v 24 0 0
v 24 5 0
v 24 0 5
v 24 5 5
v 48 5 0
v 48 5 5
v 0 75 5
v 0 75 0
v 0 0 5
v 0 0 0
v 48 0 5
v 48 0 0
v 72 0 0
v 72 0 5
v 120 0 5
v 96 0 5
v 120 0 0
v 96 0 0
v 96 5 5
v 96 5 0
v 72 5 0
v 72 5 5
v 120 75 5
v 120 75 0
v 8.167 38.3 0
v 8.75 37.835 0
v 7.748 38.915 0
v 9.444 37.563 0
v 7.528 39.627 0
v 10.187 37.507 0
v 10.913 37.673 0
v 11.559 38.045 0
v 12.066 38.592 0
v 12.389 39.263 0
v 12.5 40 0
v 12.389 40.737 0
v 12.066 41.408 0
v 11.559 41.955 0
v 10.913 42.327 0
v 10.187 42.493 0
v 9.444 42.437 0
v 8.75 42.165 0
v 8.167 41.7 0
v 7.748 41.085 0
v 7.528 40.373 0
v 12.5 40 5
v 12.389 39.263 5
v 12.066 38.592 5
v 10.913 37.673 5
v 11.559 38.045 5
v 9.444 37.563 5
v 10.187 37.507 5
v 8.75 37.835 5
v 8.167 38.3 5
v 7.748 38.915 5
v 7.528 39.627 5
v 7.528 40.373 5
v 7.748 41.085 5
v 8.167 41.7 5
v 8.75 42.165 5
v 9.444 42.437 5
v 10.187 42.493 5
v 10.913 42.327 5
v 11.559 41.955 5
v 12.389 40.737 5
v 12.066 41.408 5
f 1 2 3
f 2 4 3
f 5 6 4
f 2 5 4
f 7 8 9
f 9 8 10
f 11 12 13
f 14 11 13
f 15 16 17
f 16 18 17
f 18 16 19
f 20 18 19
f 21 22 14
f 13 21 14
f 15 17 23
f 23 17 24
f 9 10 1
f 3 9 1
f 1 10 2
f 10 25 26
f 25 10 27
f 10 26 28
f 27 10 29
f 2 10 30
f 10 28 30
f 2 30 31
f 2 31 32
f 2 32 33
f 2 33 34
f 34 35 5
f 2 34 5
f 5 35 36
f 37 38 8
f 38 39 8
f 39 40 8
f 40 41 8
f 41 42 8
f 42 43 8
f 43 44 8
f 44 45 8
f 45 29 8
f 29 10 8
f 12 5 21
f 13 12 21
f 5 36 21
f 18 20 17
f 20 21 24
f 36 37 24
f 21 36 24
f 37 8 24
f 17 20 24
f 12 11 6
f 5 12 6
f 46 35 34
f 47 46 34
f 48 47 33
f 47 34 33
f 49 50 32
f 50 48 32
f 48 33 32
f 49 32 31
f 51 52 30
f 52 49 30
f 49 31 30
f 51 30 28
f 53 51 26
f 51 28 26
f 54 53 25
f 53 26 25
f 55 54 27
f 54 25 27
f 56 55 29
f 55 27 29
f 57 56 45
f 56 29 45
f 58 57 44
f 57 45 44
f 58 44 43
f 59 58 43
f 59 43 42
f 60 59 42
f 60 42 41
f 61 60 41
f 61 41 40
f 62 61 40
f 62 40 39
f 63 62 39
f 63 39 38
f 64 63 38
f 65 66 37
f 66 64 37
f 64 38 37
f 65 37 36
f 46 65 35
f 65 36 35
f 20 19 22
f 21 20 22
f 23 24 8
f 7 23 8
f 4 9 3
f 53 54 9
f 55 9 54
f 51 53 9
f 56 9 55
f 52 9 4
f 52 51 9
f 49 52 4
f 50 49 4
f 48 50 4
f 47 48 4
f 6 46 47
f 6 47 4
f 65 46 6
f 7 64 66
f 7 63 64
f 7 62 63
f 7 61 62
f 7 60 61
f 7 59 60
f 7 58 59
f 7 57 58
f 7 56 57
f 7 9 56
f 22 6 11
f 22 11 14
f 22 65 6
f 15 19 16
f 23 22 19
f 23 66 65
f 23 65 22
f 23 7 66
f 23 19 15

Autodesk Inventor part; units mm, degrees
ref_plane "YZ Plane" through (0, 0, 0) normal (1, 0, 0) x (0, 1, 0)
ref_plane "XZ Plane" through (0, 0, 0) normal (0, 1, 0) x (-1, 0, 0)
ref_plane "XY Plane" through (0, 0, 0) normal (0, 0, 1) x (1, 0, 0)
sketch "Sketch1" plane through (0, 0, 0) normal (0, 0, 1) x (1, 0, 0)
  line L0 (0, 0) -> (120, 0)
  line L1 (120, 0) -> (120, 75)
  line L2 (120, 75) -> (0, 75)
  line L3 (0, 75) -> (0, 0)
  circle A0 centre (10, 40) radius 2.5
  dimension "d0" = 120
  dimension "d1" = 75
  dimension "d2" = 5
  dimension "d3" = 10
  dimension "d4" = 35
extrude "Extrusion1" add sketch "Sketch1" along normal blind 5
sketch "Sketch2" plane through (0, 0, 5) normal (0, 0, 1) x (1, 0, 0)
  line L0 (0, 0) -> (120, 0) projected
  line L1 (24, 0) -> (48, 0)
  line L2 (48, 0) -> (48, 5)
  line L3 (48, 5) -> (24, 5)
  line L4 (24, 5) -> (24, 0)
  line L5 (72, 0) -> (96, 0)
  line L6 (96, 0) -> (96, 5)
  line L7 (96, 5) -> (72, 5)
  line L8 (72, 5) -> (72, 0)
  line L9 (0, 75) -> (0, 0) projected
  dimension "d7" = 24
  dimension "d8" = 5
  dimension "d9" = 24
  dimension "d10" = 5
  dimension "d11" = 24
  dimension "d12" = 24
extrude "Extrusion2" cut sketch "Sketch2" against normal blind 5
sketch "Sketch3" plane through (0, 0, 5) normal (0, 0, 1) x (1, 0, 0)
  line L0 (38.7826, 73.4019) -> (98.6345, 73.4019) construction
  line L1 (98.6345, 73.4019) -> (98.6345, 53.9975) construction
  line L2 (98.6345, 53.9975) -> (38.7826, 53.9975) construction
  line L3 (38.7826, 53.9975) -> (38.7826, 73.4019) construction
  point P0 (0, 0)
sketch "Sketch4" plane through (48, 0, 0) normal (0, -1, 0) x (1, 0, 0)
  line L0 (2.1203, 4.645) -> (24.7173, 4.645) construction
  line L1 (24.7173, 4.645) -> (24.7173, 0.4931) construction
  line L2 (24.7173, 0.4931) -> (2.1203, 0.4931) construction
  line L3 (2.1203, 0.4931) -> (2.1203, 4.645) construction
  point P0 (-48, 0)
sketch "Sketch5" plane through (0, 0, 0) normal (0, 0, -1) x (-1, 0, 0)
  line L0 (-77.429, 73.1669) -> (18.9429, 73.1669) construction
  line L1 (18.9429, 73.1669) -> (18.9429, 43.3318) construction
  line L2 (18.9429, 43.3318) -> (-77.429, 43.3318) construction
  line L3 (-77.429, 43.3318) -> (-77.429, 73.1669) construction
  point P0 (0, 0)
properties part number "SpurGearMount"
